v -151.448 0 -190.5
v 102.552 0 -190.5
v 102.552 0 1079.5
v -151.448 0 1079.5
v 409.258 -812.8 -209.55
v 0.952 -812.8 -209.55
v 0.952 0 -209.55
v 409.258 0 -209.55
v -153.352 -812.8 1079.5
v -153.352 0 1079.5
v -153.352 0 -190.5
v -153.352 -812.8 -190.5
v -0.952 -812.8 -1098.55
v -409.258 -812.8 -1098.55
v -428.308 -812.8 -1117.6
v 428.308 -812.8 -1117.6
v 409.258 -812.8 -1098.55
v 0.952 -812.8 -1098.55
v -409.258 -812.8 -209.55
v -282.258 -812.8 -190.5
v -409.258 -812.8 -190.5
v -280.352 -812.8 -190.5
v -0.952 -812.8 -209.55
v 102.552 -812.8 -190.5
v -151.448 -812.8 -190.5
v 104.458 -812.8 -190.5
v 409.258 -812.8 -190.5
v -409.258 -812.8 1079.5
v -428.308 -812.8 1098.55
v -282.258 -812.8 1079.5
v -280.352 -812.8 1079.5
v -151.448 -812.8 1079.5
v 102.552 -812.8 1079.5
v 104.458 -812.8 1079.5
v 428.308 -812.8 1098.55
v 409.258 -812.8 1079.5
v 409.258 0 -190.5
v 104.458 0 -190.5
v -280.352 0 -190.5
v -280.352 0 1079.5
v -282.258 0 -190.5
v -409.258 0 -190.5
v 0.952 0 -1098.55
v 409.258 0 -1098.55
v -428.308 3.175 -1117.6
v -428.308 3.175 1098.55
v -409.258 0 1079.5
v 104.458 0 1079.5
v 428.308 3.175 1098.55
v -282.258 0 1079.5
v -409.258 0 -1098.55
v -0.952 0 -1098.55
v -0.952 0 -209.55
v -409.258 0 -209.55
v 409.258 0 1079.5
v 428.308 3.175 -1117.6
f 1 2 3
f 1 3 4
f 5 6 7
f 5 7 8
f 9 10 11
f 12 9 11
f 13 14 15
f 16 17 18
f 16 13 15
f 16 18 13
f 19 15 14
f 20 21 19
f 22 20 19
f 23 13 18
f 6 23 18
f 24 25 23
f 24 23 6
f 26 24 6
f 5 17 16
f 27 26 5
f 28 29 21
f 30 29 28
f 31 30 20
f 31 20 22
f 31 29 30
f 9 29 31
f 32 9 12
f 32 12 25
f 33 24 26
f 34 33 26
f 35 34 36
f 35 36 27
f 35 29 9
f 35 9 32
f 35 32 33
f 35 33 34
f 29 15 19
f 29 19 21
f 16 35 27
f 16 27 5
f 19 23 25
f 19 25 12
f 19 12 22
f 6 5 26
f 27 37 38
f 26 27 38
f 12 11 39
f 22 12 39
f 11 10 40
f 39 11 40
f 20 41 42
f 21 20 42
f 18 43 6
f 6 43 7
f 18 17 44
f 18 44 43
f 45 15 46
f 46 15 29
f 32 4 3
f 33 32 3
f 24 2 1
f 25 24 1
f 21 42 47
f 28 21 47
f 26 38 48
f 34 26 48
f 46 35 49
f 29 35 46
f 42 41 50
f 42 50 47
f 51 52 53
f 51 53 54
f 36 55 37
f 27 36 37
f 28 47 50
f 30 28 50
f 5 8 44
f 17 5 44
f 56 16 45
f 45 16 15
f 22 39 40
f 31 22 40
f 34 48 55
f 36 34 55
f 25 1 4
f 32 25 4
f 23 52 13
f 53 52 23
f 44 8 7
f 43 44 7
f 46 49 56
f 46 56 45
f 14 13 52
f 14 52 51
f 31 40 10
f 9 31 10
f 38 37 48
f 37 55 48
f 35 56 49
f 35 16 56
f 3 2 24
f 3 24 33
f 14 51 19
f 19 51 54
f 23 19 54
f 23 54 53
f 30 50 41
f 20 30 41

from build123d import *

# Parameters (mm, degrees)
F0_W     = 1.905
F0_H     = 889
F0_H_2   = 1270
F0_W_2   = 127
F0_H_3   = 19.05
F1_DEPTH = 812.8
F2_W     = 856.615
F2_H     = 2216.15
F3_DEPTH = 3.175


with BuildPart() as f1:
    # F0 (on Front) → F1 (new body)
    with BuildSketch(Plane.XZ):
        Polygon((-409.2575, 1079.5), (-409.2575, 1098.55), (-428.3075, 1098.55), (-428.3075, -1117.6), (-409.2575, -1117.6), (-409.2575, -1098.55), (-409.2575, -209.55), (-409.2575, -190.5), align=None)
        Polygon((-409.2575, -1098.55), (-409.2575, -1117.6), (409.2575, -1117.6), (409.2575, -1098.55), (0.9525, -1098.55), (-0.9525, -1098.55), align=None)
        Polygon((428.3075, 1098.55), (409.2575, 1098.55), (409.2575, 1079.5), (409.2575, 463.55), (409.2575, 419.1), (409.2575, -190.5), (409.2575, -209.55), (409.2575, -342.9), (409.2575, -1098.55), (409.2575, -1117.6), (428.3075, -1117.6), align=None)
        Polygon((-282.2575, -190.5), (-409.2575, -190.5), (-409.2575, -209.55), (-0.9525, -209.55), (0.9525, -209.55), (409.2575, -209.55), (409.2575, -190.5), (104.4575, -190.5), (102.5525, -190.5), (-151.4475, -190.5), (-153.3525, -190.5), (-280.3525, -190.5), align=None)
        with Locations((0, -654.05)):
            Rectangle(F0_W, F0_H)
        with Locations((-281.305, 444.5)):
            Rectangle(F0_W, F0_H_2)
        with Locations((-152.4, 444.5)):
            Rectangle(F0_W, F0_H_2)
        with Locations((103.505, 444.5)):
            Rectangle(F0_W, F0_H_2)
        Polygon((102.5525, 1098.55), (-153.3525, 1098.55), (-153.3525, 1079.5), (-151.4475, 1079.5), (102.5525, 1079.5), align=None)
        Polygon((409.2575, 1098.55), (102.5525, 1098.55), (102.5525, 1079.5), (104.4575, 1079.5), (409.2575, 1079.5), align=None)
        Polygon((-153.3525, 1098.55), (-282.2575, 1098.55), (-282.2575, 1079.5), (-280.3525, 1079.5), (-153.3525, 1079.5), align=None)
        with Locations((-345.7575, 1089.025)):
            Rectangle(F0_W_2, F0_H_3)
    extrude(amount=F1_DEPTH)

    # F2 (on face) → F3 (join)
    with BuildSketch(Plane(origin=(0, 0, 0), x_dir=(-1, 0, 0), z_dir=(0, 1, 0))):
        with Locations((0, -9.525)):
            Rectangle(F2_W, F2_H)
    extrude(amount=F3_DEPTH)


solid = f1.part
